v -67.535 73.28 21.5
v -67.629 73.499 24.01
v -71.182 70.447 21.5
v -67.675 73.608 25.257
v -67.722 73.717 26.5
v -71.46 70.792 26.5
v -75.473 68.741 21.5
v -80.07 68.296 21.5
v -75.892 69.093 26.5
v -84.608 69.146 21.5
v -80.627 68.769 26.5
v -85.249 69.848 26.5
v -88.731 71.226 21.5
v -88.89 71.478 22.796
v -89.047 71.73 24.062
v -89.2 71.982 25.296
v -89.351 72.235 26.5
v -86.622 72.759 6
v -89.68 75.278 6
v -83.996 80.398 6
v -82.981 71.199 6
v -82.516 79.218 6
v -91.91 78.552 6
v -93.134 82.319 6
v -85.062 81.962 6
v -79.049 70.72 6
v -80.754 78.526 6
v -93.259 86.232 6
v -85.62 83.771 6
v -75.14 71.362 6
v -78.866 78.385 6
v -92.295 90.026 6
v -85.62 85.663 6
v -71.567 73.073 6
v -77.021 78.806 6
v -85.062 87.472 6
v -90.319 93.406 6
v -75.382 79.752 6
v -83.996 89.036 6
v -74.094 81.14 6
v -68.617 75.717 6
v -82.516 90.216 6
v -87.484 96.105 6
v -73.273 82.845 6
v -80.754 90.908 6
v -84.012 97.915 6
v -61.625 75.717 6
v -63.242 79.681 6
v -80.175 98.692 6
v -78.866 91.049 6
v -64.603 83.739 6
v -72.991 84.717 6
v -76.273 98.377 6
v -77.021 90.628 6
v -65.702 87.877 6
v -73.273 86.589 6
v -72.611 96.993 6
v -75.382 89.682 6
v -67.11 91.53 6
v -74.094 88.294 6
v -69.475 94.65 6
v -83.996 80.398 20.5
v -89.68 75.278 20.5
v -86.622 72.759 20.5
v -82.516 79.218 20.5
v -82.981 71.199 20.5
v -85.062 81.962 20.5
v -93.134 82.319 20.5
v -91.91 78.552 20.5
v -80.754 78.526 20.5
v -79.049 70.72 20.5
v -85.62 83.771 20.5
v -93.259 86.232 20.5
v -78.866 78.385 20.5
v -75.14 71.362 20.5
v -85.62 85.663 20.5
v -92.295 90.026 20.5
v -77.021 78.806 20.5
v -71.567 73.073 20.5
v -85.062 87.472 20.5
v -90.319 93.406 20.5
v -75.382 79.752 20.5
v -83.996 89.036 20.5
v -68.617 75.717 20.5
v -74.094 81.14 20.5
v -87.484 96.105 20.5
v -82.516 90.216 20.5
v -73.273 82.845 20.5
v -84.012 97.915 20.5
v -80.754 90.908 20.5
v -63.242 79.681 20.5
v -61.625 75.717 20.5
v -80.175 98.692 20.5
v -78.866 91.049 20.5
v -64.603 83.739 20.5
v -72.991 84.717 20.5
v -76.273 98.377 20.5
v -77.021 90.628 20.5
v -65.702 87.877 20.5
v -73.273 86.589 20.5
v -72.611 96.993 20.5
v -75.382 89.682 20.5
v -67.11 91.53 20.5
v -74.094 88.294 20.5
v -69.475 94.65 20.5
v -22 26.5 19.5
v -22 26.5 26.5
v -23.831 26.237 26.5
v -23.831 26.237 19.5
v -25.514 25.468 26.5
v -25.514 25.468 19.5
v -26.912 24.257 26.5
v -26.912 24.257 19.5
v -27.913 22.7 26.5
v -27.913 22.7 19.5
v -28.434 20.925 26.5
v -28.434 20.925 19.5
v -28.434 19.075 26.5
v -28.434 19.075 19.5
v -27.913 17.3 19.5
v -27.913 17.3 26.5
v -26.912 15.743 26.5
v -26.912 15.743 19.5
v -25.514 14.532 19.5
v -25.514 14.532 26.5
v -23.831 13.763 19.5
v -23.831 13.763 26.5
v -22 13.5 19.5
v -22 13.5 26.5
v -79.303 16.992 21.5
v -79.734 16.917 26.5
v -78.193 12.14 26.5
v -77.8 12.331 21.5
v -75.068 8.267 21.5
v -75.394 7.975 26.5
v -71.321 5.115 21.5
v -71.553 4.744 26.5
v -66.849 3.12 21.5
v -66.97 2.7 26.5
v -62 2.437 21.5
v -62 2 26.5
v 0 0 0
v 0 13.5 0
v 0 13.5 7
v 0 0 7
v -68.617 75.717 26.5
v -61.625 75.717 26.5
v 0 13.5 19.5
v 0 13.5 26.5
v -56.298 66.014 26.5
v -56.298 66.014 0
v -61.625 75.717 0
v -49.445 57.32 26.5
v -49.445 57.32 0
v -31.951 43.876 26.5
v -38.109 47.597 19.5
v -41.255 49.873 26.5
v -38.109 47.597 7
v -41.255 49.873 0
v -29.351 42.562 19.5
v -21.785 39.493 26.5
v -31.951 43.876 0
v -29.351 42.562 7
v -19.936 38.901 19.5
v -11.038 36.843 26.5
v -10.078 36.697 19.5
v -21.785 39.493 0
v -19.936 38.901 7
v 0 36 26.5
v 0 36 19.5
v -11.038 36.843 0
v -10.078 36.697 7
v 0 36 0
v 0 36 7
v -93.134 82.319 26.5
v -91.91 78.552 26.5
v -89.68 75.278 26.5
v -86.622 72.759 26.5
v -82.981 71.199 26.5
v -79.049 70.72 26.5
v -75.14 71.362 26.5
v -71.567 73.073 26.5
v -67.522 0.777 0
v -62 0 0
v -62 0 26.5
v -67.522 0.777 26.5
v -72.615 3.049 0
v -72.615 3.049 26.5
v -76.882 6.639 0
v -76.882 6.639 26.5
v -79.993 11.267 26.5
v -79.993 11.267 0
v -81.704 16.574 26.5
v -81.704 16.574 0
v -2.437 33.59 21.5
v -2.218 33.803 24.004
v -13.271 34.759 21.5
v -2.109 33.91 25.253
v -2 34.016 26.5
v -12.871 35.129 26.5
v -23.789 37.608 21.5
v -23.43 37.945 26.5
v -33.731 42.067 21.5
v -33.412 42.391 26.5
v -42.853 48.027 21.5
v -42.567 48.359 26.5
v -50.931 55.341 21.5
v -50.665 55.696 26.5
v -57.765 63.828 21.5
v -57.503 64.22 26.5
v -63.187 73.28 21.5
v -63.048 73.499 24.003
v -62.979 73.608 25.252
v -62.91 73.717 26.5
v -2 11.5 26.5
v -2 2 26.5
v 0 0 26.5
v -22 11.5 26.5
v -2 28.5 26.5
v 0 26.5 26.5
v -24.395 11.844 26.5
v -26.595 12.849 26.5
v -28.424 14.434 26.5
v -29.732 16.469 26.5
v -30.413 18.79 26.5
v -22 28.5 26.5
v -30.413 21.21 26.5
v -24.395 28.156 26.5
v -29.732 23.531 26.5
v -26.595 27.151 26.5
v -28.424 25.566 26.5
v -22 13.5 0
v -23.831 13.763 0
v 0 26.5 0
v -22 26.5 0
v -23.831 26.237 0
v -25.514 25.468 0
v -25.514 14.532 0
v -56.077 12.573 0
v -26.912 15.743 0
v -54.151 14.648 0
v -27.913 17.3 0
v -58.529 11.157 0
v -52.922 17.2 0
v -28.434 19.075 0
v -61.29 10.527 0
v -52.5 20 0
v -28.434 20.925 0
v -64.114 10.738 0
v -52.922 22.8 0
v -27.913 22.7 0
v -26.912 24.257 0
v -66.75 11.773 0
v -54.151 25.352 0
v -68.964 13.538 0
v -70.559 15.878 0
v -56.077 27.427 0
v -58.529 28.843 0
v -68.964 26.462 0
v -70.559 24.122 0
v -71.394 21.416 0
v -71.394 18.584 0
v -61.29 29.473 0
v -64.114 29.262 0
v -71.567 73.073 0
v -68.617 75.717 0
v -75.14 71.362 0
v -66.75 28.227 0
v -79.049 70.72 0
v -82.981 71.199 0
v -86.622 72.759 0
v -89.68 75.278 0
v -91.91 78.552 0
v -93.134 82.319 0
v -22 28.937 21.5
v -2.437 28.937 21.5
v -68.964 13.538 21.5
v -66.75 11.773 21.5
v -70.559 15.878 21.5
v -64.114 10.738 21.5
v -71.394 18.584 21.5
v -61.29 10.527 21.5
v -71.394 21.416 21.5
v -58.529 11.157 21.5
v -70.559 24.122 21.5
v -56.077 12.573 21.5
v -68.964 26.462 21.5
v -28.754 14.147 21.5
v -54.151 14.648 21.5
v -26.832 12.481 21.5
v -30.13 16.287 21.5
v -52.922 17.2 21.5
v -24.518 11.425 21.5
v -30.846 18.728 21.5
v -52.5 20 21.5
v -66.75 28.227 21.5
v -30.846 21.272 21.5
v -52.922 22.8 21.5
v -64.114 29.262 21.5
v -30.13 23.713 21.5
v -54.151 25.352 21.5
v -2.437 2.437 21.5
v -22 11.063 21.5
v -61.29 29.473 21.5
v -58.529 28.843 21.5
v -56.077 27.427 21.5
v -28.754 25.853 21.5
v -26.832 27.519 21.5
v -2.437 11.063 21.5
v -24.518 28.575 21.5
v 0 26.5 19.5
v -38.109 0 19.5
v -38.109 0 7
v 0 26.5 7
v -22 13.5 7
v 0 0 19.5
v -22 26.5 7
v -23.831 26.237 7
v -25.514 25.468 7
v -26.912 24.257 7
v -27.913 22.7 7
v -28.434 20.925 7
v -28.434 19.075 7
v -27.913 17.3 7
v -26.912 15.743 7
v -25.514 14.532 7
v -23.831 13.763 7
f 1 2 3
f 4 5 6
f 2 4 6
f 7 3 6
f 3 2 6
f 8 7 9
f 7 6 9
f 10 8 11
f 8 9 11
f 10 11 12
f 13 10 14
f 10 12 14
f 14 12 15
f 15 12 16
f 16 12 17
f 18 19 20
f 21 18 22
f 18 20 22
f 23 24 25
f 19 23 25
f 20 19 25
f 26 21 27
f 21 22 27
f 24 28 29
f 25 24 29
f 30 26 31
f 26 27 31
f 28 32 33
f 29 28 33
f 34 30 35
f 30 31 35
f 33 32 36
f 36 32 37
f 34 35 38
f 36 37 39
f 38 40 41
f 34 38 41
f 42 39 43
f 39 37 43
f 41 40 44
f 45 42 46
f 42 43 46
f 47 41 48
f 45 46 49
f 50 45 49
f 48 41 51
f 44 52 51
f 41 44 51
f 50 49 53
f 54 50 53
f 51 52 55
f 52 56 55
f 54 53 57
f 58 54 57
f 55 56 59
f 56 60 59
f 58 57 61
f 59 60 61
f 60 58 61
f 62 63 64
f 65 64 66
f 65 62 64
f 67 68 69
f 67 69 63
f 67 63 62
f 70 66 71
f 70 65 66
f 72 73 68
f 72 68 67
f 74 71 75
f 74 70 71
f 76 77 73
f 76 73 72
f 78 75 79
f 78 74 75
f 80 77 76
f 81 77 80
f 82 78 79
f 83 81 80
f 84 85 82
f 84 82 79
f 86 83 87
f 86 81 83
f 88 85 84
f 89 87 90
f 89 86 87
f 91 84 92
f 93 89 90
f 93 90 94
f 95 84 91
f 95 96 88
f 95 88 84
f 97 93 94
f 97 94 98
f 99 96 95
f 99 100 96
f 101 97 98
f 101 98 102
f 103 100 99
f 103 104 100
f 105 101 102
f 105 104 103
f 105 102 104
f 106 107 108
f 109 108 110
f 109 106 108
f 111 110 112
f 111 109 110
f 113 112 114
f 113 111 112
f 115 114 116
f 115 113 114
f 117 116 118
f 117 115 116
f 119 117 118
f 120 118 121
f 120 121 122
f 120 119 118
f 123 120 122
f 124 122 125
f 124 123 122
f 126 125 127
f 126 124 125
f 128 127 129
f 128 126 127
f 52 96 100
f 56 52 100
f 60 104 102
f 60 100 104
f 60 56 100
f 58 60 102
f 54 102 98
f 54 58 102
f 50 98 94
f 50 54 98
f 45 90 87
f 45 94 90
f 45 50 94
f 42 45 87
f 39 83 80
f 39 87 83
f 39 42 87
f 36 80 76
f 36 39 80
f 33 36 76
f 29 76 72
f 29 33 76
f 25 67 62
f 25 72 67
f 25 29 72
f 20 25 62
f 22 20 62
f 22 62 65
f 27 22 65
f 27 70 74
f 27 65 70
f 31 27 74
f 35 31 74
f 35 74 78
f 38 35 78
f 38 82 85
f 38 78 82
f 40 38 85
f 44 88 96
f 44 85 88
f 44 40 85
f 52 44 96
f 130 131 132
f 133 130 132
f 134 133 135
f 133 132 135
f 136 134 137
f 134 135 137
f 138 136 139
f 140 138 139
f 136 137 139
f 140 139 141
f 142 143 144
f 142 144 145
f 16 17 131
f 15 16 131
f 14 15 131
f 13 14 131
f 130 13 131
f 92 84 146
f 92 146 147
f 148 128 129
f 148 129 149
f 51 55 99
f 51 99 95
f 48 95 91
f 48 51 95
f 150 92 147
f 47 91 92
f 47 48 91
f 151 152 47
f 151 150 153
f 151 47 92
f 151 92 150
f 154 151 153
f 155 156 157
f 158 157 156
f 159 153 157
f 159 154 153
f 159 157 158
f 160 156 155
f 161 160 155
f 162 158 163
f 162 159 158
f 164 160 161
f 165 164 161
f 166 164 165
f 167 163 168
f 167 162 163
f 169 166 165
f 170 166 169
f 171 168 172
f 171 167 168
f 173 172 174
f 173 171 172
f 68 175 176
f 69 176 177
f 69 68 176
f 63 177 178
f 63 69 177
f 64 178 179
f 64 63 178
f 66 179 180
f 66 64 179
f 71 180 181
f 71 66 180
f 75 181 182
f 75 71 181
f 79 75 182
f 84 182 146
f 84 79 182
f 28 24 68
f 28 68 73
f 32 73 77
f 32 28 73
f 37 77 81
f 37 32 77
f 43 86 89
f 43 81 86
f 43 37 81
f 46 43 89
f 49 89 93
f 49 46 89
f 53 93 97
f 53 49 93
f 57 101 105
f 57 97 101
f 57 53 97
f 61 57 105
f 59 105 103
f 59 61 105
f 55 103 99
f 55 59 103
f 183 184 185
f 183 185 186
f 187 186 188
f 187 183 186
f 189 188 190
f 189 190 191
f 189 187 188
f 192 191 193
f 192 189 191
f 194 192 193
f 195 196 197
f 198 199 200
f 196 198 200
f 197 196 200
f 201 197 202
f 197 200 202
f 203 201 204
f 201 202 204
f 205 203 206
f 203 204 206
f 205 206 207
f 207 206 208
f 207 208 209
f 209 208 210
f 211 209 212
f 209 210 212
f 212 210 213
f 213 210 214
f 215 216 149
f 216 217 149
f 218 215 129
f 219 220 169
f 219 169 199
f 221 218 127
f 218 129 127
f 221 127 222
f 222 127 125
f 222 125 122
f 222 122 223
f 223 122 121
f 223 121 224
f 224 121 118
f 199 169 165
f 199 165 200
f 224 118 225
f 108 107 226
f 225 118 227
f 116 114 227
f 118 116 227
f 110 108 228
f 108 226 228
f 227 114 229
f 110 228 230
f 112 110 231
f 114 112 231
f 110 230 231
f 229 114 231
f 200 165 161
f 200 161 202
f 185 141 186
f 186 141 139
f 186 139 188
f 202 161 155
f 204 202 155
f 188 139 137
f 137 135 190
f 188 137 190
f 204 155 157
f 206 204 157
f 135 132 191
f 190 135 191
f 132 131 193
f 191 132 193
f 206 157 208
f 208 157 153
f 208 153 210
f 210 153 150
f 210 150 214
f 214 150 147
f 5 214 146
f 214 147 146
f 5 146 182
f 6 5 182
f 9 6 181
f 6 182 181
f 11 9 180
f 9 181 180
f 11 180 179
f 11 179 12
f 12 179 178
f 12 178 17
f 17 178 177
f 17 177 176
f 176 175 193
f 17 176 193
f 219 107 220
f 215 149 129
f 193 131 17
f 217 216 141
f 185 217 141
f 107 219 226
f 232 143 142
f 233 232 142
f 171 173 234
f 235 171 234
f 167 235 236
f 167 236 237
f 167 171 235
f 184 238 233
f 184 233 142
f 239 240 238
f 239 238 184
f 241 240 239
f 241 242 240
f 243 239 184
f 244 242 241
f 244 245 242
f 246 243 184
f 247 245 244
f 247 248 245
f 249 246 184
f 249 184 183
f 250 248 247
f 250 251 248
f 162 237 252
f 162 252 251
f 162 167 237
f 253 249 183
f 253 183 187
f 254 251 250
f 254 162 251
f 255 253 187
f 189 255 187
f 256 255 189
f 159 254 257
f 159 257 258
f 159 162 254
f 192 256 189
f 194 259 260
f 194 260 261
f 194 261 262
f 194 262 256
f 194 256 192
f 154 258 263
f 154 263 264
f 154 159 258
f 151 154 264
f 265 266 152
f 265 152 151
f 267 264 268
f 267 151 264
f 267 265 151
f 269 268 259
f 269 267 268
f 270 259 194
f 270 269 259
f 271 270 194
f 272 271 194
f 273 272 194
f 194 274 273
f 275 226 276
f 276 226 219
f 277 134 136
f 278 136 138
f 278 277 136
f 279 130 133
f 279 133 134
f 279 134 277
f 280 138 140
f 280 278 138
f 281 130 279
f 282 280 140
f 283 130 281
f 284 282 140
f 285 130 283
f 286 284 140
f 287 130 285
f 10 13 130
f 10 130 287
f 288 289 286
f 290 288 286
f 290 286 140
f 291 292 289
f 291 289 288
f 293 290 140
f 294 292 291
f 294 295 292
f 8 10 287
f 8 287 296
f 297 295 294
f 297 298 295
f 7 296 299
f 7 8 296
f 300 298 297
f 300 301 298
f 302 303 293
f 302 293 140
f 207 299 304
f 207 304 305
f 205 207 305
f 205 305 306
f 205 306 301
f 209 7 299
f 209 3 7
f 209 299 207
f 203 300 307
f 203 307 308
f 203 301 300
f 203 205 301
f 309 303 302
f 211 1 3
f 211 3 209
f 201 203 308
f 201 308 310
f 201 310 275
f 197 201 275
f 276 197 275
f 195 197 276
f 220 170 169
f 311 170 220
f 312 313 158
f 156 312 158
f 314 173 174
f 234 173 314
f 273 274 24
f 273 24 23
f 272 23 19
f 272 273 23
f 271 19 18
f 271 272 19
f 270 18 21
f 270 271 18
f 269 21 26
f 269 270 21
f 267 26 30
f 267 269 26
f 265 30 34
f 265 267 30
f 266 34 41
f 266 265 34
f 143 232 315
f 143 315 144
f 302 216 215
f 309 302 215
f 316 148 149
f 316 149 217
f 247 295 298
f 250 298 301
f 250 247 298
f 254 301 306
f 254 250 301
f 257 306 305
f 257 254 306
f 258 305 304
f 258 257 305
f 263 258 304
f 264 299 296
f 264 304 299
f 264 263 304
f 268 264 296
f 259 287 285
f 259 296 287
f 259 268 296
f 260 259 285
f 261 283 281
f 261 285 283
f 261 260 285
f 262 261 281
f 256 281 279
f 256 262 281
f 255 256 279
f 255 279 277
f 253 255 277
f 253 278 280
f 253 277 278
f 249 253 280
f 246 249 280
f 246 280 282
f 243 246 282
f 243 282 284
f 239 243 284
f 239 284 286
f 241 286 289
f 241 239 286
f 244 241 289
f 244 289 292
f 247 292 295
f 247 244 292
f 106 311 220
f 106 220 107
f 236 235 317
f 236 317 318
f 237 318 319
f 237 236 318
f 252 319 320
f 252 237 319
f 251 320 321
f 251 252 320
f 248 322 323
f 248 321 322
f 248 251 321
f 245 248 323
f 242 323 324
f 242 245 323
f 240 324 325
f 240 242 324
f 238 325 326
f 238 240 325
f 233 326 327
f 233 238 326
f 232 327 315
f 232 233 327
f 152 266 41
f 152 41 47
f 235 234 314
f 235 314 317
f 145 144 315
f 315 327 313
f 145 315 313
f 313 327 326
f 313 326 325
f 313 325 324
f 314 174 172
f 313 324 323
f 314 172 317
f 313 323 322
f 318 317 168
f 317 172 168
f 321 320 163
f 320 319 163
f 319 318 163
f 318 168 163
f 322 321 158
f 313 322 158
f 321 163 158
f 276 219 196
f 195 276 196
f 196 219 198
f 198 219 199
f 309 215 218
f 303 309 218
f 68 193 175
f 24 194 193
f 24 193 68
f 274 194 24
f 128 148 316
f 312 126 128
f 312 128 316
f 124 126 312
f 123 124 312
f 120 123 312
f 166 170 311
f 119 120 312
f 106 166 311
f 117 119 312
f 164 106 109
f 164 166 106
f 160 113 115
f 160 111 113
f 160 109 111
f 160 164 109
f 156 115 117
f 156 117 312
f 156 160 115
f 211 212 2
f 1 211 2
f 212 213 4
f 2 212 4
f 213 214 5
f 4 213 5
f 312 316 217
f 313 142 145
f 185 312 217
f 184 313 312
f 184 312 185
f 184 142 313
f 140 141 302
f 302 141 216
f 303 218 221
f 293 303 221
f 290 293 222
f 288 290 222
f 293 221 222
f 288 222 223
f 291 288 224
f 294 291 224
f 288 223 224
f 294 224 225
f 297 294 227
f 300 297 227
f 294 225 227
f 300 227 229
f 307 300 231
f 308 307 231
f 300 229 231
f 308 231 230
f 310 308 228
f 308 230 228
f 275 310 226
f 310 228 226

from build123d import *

# Parameters (mm, degrees)
SKETCH2_R               = 6.35
SKETCH2_R_2             = 9.5
BOSS_EXTRUDE2_DEPTH     = 26.5
CUT_EXTRUDE1_START      = -6
CUT_EXTRUDE1_DEPTH      = 6
CUT_EXTRUDE2_DEPTH      = 6
CUT_EXTRUDE3_DEPTH      = 6.25
CUT_EXTRUDE3_DEPTH_BACK = 6.25
CUT_EXTRUDE7_DEPTH      = 5
CUT_EXTRUDE7_DRAFT      = -5


with BuildPart() as part:
    # Sketch2 → Boss-Extrude2 (new body)
    with BuildSketch(Plane.XY):
        with BuildLine():
            Line((0, 0), (-62, 0))
            ThreePointArc((-62, 0), (-74.874173195, 4.694587084), (-81.704453671, 16.574433546))
            Line((-81.704453671, 16.574433546), (-93.133993592, 82.319133844))
            ThreePointArc((-93.133993592, 82.319133844), (-82.120785811, 98.438258498), (-65.702115422, 87.876810306))
            ThreePointArc((-65.702115422, 87.876810306), (-41.950384105, 50.414084566), (0, 36))
            Line((0, 36), (0, 26.5))
            Line((0, 26.5), (-22, 26.5))
            ThreePointArc((-22, 26.5), (-28.5, 20), (-22, 13.5))
            Line((-22, 13.5), (0, 13.5))
            Line((0, 13.5), (0, 0))
        make_face()
        with Locations((-79.340876022, 84.717030361)):
            Circle(SKETCH2_R, mode=Mode.SUBTRACT)
        with Locations((-62, 20)):
            Circle(SKETCH2_R_2, mode=Mode.SUBTRACT)
    extrude(amount=BOSS_EXTRUDE2_DEPTH)

    # Sketch3 → Cut-Extrude1 (cut)
    with BuildSketch(Plane.XY.offset(26.5).offset(CUT_EXTRUDE1_START)):
        with BuildLine():
            Line((-68.617070727, 75.717030361), (-61.624981931, 75.717030361))
            ThreePointArc((-61.624981931, 75.717030361), (-63.955170346, 81.699140564), (-65.702115422, 87.876810306))
            ThreePointArc((-65.702115422, 87.876810306), (-92.955159562, 87.980660806), (-68.617070727, 75.717030361))
        make_face()
    extrude(amount=CUT_EXTRUDE1_DEPTH, mode=Mode.SUBTRACT)

    # Sketch4 → Cut-Extrude2 (cut)
    with BuildSketch(Plane(origin=(0, 0, 0), x_dir=(-1, 0, 0), z_dir=(0, 0, -1))):
        with BuildLine():
            Line((68.617070727, 75.717030361), (61.624981931, 75.717030361))
            ThreePointArc((61.624981931, 75.717030361), (63.955170346, 81.699140564), (65.702115422, 87.876810306))
            ThreePointArc((65.702115422, 87.876810306), (92.955159562, 87.980660806), (68.617070727, 75.717030361))
        make_face()
    extrude(amount=-CUT_EXTRUDE2_DEPTH, mode=Mode.SUBTRACT)

    # Sketch6 → Cut-Extrude3 (cut, two sides: drawn at the far end of the back side and taken through both)
    with BuildSketch(Plane.XY.offset(13.25).offset(-CUT_EXTRUDE3_DEPTH_BACK)):
        with BuildLine():
            Line((0, 0), (-38.108793453, 0))
            Line((-38.108793453, 0), (-38.108793453, 47.596659083))
            ThreePointArc((-38.108793453, 47.596659083), (-19.936162439, 38.900682282), (0, 36))
            Line((0, 36), (0, 0))
        make_face()
    extrude(amount=CUT_EXTRUDE3_DEPTH + CUT_EXTRUDE3_DEPTH_BACK, mode=Mode.SUBTRACT)


with BuildPart() as cut_extrude7_tool:
    # Sketch7 → Cut-Extrude7 (with draft: the straight prism first)
    with BuildSketch(Plane.XY.offset(26.5)):
        with BuildLine():
            Line((-89.350908837, 72.235073662), (-79.734008304, 16.916990192))
            ThreePointArc((-79.734008304, 16.916990192), (-73.586755876, 6.225128375), (-62, 2))
            Line((-62, 2), (-2, 2))
            Line((-2, 2), (-2, 11.5))
            Line((-2, 11.5), (-22, 11.5))
            ThreePointArc((-22, 11.5), (-30.5, 20), (-22, 28.5))
            Line((-22, 28.5), (-2, 28.5))
            Line((-2, 28.5), (-2, 34.016457666))
            ThreePointArc((-2, 34.016457666), (-38.108007625, 45.193460051), (-62.909611076, 73.717030361))
            Line((-62.909611076, 73.717030361), (-67.721925983, 73.717030361))
            ThreePointArc((-67.721925983, 73.717030361), (-78.247165561, 68.754455462), (-89.350908837, 72.235073662))
        make_face()
    extrude(amount=-CUT_EXTRUDE7_DEPTH)
    # Cut-Extrude7: the draft: its side faces are tilted about the plane it starts from
    cut_extrude7_sides = [cut_extrude7_tool.faces().sort_by_distance(p)[0] for p in [
        (-38.108007625, 45.193460051, 24),
        (-65.31576853, 73.717030361, 24),
        (-78.247165561, 68.754455462, 24),
        (-84.542458571, 44.576031927, 24),
        (-73.586755876, 6.225128375, 24),
        (-32, 2, 24),
        (-2, 6.75, 24),
        (-12, 11.5, 24),
        (-30.5, 20, 24),
        (-12, 28.5, 24),
        (-2, 31.258228833, 24),
    ]]
    draft(cut_extrude7_sides, Plane.XY.offset(26.5), CUT_EXTRUDE7_DRAFT)


with BuildPart() as part_1:
    add(part.part)

    # Cut-Extrude7: cut by cut_extrude7_tool
    add(cut_extrude7_tool.part, mode=Mode.SUBTRACT)


solid = part_1.part
